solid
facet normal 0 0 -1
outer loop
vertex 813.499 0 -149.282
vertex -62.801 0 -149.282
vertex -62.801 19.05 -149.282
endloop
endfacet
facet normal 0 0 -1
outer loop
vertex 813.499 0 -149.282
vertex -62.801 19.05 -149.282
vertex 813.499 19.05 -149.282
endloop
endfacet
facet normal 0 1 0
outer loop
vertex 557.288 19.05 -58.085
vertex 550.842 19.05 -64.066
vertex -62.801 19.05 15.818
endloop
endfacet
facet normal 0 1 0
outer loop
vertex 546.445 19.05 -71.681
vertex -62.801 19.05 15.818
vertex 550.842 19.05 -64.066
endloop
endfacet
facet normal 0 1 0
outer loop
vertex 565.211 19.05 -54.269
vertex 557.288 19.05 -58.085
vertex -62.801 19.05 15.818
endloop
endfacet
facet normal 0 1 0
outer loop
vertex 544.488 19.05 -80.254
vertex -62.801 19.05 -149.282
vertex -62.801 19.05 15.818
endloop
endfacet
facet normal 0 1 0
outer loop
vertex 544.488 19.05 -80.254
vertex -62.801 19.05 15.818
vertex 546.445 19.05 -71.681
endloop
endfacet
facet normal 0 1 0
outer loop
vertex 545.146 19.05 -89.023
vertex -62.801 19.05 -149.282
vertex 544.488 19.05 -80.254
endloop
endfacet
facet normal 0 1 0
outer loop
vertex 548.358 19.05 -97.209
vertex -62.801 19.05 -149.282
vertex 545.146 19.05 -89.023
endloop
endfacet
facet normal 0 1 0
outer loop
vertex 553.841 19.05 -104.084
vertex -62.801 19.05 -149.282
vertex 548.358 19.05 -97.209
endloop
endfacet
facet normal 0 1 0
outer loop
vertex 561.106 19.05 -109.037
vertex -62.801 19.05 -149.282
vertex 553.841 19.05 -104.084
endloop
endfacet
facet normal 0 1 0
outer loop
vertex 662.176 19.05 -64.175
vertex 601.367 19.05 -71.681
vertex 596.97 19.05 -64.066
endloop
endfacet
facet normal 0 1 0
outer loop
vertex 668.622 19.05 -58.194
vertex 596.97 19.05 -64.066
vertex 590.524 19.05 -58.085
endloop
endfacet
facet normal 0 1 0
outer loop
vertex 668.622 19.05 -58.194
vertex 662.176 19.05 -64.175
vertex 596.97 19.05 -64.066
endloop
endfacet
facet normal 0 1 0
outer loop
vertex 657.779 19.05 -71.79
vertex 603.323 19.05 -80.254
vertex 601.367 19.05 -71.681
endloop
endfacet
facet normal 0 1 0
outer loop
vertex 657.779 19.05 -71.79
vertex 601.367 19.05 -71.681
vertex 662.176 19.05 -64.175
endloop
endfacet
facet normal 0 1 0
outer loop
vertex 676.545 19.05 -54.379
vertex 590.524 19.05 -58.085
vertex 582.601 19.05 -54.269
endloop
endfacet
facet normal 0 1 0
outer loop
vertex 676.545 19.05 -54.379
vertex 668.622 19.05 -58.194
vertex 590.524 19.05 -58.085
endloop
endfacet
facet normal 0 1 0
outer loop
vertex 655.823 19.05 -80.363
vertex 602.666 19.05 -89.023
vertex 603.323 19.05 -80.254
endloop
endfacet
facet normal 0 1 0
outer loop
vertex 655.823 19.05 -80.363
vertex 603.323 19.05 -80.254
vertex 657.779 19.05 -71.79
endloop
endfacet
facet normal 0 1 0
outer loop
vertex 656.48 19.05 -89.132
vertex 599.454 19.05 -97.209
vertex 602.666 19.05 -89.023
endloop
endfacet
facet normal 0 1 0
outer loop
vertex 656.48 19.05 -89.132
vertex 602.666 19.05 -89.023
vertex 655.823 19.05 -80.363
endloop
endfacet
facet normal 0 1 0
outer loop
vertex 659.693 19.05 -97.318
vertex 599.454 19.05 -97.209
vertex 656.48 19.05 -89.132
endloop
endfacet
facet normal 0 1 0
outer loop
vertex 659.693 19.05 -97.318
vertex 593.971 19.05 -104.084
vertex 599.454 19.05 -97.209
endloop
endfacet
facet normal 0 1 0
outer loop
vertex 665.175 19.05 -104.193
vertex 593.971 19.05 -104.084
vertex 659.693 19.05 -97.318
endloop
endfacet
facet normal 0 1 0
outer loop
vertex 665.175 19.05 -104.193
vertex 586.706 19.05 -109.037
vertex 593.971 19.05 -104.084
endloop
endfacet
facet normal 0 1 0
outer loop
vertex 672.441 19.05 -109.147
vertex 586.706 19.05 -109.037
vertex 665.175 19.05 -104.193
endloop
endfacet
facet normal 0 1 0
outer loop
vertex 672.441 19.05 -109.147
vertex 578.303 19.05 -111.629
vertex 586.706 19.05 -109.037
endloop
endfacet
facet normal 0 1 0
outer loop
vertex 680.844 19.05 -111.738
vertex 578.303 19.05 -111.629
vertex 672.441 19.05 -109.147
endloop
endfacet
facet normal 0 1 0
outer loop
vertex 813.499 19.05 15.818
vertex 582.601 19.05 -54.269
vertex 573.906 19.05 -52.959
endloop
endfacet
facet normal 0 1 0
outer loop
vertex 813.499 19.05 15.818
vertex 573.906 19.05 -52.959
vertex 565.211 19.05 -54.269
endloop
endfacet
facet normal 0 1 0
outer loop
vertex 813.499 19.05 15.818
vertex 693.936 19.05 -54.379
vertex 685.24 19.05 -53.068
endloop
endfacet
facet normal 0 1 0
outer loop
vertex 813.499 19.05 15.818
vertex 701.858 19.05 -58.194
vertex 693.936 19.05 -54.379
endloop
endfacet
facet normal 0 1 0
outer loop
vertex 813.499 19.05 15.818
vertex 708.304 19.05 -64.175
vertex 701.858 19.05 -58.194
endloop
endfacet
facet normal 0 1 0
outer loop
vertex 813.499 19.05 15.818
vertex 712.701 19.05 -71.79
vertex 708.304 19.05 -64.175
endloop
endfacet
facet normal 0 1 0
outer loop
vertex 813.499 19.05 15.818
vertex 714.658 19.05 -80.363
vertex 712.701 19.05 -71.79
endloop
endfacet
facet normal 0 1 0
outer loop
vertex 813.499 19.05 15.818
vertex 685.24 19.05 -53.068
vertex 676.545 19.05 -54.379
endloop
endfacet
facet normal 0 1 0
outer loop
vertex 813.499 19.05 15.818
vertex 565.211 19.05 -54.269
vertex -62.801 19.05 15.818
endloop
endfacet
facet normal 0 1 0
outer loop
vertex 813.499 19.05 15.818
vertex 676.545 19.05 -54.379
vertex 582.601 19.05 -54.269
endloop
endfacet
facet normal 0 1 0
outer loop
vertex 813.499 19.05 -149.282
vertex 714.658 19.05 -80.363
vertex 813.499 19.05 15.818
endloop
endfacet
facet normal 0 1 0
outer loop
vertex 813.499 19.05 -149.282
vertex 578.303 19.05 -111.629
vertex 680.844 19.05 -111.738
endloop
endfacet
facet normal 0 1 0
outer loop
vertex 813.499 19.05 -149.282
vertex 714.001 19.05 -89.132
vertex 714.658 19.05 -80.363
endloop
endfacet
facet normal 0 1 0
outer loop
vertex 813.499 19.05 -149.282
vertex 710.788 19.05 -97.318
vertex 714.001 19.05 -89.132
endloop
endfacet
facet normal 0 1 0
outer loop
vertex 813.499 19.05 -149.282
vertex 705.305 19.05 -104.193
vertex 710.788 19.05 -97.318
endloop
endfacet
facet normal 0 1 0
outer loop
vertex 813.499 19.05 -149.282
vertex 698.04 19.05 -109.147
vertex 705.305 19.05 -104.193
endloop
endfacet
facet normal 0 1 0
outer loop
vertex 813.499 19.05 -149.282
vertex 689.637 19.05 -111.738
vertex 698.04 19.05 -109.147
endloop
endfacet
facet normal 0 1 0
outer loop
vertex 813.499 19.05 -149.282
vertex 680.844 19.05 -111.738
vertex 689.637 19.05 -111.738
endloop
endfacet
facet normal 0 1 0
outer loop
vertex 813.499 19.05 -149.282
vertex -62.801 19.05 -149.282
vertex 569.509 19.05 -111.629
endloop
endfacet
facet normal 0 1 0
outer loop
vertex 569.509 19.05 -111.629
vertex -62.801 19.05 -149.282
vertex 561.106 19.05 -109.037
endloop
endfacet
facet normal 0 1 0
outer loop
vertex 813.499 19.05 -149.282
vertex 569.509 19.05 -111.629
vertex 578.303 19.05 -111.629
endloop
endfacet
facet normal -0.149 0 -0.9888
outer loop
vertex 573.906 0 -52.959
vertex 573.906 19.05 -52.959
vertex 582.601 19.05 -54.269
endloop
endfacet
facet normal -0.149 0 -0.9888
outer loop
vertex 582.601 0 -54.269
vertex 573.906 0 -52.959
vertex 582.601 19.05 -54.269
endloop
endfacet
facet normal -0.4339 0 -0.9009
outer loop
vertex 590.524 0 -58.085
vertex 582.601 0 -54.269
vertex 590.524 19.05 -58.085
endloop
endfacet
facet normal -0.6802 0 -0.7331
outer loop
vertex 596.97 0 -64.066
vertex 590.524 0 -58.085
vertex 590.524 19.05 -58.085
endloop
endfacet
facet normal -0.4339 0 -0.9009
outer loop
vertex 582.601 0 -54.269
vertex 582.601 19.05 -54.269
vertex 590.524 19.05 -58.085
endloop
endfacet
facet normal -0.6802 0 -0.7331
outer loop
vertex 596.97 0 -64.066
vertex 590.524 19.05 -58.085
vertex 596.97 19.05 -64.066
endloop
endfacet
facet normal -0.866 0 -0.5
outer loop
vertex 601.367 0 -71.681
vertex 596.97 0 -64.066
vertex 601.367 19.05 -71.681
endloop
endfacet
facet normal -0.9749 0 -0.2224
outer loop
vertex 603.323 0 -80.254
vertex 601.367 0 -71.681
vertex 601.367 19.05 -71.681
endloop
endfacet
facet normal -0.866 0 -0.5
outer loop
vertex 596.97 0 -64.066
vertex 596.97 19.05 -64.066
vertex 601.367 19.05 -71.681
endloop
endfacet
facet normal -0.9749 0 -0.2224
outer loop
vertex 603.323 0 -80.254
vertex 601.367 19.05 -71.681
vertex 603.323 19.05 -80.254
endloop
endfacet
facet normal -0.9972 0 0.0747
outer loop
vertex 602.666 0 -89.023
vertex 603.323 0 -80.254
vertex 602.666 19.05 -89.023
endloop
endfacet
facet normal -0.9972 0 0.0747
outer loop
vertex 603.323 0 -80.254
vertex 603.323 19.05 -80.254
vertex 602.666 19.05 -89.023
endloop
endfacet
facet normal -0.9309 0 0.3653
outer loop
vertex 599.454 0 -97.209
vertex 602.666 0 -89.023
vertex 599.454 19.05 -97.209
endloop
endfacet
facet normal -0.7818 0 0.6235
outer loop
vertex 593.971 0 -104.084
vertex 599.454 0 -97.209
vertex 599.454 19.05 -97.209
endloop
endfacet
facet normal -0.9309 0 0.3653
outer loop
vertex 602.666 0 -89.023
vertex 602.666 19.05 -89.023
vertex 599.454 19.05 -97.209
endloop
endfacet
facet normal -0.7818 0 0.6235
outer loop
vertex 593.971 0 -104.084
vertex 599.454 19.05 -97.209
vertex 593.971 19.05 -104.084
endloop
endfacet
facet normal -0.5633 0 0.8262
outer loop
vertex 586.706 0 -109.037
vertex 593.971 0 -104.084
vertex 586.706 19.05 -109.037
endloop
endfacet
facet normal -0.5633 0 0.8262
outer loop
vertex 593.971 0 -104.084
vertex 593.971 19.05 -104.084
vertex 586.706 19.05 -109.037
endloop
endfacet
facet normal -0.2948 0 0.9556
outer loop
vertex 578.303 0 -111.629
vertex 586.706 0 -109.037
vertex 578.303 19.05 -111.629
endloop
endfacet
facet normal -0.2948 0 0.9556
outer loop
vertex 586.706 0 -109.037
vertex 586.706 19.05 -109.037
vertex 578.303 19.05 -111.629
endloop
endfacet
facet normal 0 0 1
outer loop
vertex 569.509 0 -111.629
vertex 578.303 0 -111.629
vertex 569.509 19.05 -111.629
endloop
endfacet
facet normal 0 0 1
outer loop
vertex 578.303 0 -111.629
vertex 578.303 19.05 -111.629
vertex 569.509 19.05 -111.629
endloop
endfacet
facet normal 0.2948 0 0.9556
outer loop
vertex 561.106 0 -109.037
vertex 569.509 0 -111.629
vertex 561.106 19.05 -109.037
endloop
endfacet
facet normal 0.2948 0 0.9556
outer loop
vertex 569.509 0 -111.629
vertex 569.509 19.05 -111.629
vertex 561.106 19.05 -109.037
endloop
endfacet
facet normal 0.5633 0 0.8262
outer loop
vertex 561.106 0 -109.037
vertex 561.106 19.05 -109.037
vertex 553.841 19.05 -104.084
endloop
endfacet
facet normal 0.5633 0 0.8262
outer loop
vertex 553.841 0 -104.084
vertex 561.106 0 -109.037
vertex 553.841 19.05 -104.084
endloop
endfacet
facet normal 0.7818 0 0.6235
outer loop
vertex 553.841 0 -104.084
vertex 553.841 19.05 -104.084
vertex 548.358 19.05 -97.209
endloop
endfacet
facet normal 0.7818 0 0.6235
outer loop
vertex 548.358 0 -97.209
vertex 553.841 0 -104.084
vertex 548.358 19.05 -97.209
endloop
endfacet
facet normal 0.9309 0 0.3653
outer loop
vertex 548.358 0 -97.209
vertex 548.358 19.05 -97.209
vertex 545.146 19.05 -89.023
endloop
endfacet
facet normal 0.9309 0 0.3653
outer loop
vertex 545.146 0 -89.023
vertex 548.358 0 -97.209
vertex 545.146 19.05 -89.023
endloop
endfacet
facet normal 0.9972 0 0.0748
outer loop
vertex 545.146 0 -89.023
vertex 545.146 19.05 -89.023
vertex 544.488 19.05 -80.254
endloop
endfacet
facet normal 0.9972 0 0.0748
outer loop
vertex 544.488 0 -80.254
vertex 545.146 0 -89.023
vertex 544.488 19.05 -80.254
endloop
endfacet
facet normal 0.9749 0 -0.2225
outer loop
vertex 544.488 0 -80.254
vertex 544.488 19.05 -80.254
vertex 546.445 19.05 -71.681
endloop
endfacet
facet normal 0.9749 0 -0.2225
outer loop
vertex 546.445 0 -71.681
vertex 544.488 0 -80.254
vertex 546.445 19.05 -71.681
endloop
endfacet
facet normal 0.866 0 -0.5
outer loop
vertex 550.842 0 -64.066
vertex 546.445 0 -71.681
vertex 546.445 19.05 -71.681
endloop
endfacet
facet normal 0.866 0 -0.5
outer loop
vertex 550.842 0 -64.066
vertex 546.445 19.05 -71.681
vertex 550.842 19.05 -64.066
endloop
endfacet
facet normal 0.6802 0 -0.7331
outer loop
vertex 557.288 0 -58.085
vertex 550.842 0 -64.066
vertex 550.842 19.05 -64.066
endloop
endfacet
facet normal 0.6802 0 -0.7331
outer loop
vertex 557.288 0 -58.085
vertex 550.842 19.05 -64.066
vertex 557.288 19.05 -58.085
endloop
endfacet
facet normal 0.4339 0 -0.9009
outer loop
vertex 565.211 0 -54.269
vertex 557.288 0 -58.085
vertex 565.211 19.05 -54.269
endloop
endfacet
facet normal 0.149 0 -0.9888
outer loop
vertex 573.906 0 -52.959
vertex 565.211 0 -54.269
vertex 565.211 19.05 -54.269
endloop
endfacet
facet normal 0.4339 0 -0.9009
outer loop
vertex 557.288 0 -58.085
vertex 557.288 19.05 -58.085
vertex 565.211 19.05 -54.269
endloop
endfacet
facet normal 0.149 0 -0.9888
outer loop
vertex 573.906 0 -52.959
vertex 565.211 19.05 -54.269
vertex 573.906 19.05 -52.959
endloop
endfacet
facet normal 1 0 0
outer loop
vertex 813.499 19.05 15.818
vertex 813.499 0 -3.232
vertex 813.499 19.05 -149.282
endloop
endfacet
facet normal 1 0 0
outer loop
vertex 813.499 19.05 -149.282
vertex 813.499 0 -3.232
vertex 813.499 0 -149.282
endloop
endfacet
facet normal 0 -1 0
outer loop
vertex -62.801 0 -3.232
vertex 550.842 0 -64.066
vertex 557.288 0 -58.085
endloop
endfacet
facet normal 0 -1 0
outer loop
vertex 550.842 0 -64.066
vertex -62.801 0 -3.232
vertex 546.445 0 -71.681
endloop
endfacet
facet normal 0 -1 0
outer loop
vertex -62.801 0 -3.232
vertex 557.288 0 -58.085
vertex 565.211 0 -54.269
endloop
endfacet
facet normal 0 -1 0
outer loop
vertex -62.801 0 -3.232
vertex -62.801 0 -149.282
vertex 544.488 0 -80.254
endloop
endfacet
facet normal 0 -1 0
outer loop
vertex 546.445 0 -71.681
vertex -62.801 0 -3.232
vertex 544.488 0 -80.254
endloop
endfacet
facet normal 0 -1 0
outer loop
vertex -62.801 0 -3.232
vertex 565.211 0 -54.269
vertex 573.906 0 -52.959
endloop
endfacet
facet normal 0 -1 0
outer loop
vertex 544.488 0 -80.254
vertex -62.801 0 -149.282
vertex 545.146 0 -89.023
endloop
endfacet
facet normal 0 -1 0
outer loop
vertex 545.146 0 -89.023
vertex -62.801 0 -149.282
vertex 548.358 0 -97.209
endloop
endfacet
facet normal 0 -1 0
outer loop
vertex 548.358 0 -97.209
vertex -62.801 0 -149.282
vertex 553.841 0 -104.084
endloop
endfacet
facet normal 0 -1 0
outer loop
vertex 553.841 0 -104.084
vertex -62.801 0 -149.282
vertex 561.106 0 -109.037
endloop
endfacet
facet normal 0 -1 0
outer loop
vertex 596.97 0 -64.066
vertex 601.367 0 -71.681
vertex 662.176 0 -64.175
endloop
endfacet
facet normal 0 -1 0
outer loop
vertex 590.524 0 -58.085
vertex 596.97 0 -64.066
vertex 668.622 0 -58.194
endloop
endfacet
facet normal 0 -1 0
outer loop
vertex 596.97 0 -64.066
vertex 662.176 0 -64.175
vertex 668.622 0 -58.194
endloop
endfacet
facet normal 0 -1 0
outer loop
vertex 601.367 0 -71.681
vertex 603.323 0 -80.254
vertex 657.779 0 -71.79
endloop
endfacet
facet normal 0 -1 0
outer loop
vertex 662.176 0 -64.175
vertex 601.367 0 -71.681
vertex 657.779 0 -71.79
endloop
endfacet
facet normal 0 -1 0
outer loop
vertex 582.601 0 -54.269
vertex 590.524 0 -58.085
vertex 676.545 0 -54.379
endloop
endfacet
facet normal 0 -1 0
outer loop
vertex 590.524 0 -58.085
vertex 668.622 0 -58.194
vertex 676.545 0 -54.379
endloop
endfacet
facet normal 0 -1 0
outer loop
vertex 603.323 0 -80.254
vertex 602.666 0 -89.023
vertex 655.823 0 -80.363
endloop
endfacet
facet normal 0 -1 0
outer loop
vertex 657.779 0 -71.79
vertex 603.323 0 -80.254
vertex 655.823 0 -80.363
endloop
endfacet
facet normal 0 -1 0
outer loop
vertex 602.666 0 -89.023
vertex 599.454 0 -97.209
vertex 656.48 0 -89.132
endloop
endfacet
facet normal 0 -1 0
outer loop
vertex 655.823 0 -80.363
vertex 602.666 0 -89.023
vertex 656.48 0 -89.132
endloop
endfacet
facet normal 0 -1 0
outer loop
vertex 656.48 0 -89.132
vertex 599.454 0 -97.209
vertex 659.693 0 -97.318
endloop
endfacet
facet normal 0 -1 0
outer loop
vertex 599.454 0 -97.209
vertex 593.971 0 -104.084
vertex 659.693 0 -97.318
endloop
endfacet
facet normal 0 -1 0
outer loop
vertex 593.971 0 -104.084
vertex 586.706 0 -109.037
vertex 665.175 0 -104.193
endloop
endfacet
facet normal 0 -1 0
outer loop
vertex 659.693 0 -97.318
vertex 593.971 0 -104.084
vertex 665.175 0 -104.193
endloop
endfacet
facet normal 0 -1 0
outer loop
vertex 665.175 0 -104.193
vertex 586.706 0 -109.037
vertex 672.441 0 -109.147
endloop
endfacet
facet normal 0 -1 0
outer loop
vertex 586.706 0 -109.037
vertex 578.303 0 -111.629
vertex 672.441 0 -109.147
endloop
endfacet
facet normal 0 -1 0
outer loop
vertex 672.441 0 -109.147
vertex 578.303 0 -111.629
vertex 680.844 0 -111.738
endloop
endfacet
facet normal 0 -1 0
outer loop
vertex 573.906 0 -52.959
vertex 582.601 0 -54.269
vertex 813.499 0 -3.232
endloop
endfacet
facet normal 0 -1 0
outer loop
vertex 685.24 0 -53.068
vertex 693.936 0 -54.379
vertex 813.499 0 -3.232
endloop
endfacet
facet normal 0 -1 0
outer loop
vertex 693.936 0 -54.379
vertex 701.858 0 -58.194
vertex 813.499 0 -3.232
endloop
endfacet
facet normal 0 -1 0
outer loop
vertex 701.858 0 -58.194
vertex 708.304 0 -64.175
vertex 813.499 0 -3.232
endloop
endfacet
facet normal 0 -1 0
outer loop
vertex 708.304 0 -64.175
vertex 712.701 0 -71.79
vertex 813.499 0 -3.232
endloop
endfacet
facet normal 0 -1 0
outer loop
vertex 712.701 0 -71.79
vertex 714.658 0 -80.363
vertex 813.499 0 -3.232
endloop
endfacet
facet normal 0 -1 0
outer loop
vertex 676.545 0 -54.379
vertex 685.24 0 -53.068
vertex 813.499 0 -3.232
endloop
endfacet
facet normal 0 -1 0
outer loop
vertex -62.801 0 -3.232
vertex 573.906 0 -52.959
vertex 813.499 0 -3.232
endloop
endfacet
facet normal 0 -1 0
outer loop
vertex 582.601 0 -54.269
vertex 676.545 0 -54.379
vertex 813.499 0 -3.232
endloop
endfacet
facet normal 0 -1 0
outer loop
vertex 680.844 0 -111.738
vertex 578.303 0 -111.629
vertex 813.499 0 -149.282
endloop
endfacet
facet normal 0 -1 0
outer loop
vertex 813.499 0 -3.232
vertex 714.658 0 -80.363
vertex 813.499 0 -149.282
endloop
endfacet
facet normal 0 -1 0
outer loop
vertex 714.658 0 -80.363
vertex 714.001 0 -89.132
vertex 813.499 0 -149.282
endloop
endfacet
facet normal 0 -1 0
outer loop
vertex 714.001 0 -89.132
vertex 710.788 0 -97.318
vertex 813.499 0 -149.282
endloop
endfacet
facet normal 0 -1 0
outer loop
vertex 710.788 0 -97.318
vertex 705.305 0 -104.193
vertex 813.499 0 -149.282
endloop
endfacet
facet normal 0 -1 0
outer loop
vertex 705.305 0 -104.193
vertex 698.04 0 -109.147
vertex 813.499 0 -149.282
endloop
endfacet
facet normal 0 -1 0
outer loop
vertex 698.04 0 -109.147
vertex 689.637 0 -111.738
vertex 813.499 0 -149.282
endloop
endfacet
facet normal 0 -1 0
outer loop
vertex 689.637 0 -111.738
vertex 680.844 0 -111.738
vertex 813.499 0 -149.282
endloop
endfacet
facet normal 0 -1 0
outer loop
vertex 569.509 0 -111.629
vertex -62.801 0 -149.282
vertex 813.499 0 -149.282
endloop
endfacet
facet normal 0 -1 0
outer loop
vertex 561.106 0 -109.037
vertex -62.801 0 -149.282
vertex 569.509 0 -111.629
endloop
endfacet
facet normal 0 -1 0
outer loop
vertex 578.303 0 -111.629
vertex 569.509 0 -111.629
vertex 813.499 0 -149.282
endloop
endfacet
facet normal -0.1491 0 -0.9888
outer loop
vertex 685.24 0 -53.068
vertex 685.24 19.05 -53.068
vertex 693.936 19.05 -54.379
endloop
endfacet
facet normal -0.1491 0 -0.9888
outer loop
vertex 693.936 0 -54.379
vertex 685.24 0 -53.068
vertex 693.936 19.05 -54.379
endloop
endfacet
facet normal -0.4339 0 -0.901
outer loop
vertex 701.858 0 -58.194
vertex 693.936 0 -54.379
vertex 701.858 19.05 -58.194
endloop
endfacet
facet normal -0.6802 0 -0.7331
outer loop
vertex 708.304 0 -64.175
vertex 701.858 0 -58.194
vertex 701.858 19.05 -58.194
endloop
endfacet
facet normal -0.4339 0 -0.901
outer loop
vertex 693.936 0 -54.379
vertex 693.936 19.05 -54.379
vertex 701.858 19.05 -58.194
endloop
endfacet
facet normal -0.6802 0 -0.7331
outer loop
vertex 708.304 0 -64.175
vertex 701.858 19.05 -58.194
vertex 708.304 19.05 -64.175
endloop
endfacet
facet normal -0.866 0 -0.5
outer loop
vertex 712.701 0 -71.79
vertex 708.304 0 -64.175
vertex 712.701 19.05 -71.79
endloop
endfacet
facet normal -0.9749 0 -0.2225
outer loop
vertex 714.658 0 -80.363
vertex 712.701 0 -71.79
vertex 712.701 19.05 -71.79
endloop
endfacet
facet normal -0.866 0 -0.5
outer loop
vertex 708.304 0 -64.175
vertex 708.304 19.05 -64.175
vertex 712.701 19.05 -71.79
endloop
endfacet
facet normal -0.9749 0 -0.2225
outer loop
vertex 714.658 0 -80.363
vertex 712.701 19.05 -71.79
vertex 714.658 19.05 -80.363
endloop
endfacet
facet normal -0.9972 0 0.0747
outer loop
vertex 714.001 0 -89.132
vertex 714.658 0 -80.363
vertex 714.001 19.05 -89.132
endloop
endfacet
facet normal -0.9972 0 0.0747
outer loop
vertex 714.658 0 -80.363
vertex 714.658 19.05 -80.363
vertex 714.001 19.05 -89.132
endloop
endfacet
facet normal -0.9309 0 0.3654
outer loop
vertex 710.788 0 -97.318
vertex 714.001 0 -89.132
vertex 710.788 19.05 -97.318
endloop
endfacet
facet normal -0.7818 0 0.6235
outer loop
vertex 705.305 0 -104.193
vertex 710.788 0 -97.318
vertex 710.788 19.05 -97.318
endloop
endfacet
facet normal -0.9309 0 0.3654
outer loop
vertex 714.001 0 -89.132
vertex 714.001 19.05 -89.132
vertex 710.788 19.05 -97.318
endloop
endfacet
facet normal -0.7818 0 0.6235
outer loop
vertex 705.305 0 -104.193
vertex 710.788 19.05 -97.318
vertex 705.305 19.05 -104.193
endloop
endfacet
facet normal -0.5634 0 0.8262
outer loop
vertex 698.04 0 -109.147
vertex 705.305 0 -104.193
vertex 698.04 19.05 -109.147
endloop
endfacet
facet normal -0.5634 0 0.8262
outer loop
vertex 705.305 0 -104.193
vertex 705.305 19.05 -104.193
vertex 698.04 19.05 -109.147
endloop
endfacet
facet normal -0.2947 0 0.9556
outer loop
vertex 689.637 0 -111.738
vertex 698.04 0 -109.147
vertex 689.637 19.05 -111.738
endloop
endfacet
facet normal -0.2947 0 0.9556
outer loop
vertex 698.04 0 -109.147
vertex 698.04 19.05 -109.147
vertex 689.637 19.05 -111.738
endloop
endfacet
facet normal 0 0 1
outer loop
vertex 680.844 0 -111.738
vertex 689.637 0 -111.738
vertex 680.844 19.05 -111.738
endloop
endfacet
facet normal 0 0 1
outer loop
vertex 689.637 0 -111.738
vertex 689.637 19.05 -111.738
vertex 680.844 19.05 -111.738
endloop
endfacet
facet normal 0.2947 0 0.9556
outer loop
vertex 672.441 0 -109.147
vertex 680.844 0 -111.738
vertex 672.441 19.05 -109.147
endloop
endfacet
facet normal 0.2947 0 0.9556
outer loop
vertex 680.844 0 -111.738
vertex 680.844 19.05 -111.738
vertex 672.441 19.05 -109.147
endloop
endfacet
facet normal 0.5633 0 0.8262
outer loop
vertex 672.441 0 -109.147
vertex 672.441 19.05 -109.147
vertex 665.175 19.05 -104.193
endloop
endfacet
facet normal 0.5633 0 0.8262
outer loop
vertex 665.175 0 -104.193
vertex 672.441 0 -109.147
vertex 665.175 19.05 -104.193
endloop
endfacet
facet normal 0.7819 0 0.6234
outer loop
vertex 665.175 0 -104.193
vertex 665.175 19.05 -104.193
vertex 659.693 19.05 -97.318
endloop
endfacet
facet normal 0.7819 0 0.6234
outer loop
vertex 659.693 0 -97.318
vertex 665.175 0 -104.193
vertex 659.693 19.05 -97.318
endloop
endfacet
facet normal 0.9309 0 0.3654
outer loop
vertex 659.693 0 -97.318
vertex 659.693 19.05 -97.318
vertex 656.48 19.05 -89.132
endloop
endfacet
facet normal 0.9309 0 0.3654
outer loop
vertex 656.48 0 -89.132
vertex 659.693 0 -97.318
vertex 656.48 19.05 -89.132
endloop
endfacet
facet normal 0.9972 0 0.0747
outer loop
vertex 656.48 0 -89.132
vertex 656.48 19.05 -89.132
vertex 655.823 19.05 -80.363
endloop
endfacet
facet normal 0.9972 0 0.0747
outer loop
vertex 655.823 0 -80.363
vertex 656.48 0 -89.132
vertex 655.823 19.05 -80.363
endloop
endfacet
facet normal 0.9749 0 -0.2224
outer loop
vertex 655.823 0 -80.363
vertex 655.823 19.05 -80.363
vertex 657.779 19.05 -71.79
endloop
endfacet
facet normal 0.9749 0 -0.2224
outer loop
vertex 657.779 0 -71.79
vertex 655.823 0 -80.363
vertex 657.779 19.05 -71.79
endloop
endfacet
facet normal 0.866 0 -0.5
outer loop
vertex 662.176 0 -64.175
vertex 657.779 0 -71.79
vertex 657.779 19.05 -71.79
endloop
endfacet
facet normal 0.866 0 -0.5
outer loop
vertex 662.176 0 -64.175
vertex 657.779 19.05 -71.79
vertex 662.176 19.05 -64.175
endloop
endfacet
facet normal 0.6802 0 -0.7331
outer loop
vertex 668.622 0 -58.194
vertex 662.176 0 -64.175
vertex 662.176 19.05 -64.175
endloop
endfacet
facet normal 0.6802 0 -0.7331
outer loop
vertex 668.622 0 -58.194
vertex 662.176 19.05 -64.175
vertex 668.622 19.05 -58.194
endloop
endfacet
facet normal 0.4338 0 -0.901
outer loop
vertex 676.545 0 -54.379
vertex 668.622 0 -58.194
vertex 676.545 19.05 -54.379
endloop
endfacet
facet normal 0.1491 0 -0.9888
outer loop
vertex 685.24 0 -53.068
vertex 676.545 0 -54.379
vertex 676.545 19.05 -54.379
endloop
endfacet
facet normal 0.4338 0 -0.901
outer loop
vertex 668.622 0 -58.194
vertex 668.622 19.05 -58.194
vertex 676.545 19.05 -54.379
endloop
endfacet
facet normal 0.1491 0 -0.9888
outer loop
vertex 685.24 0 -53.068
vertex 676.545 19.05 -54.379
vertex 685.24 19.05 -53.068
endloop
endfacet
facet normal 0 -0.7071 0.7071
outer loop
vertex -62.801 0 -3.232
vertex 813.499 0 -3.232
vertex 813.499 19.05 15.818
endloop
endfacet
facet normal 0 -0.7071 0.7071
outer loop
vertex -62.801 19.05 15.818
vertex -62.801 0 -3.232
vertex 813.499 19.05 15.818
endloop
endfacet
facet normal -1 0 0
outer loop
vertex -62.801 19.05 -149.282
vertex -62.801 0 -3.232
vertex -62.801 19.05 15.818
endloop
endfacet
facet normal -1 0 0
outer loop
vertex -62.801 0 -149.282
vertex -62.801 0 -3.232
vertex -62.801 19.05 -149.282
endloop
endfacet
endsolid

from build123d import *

# Parameters (mm, degrees)
SKETCH1_W           = 876.3
SKETCH1_H           = 165.1
BOSS_EXTRUDE1_DEPTH = 19.05
SKETCH3_R           = 29.499999928
CUT_EXTRUDE1_DEPTH  = 19.05
SKETCH2_R           = 29.499999928
CUT_EXTRUDE2_DEPTH  = 19.05
CUT_EXTRUDE3_DEPTH  = 914.4


with BuildPart() as part:
    # Sketch1 → Boss-Extrude1 (new body)
    with BuildSketch(Plane(origin=(0, 0, 0), x_dir=(1, 0, 0), z_dir=(0, 1, 0))):
        with Locations((375.34945696, 66.731818106)):
            Rectangle(SKETCH1_W, SKETCH1_H)
    extrude(amount=BOSS_EXTRUDE1_DEPTH)

    # Sketch3 → Cut-Extrude1 (cut)
    with BuildSketch(Plane(origin=(0, 19.05, 0), x_dir=(1, 0, 0), z_dir=(0, 1, 0))):
        with Locations(Location((573.905935058, 82.4588113, 0), (0, 0, 270))):
            Circle(SKETCH3_R)
    extrude(amount=-CUT_EXTRUDE1_DEPTH, mode=Mode.SUBTRACT)

    # Sketch2 → Cut-Extrude2 (cut)
    with BuildSketch(Plane(origin=(0, 19.05, 0), x_dir=(1, 0, 0), z_dir=(0, 1, 0))):
        with Locations(Location((685.24027425, 82.567946762, 0), (0, 0, 270))):
            Circle(SKETCH2_R)
    extrude(amount=-CUT_EXTRUDE2_DEPTH, mode=Mode.SUBTRACT)

    # Sketch4 → Cut-Extrude3 (cut)
    with BuildSketch(Plane.ZY.offset(62.80054304)):
        Polygon((-3.231818106, 0), (15.818181894, 19.05), (15.818181894, 0), align=None)
    extrude(amount=-CUT_EXTRUDE3_DEPTH, mode=Mode.SUBTRACT)


solid = part.part
